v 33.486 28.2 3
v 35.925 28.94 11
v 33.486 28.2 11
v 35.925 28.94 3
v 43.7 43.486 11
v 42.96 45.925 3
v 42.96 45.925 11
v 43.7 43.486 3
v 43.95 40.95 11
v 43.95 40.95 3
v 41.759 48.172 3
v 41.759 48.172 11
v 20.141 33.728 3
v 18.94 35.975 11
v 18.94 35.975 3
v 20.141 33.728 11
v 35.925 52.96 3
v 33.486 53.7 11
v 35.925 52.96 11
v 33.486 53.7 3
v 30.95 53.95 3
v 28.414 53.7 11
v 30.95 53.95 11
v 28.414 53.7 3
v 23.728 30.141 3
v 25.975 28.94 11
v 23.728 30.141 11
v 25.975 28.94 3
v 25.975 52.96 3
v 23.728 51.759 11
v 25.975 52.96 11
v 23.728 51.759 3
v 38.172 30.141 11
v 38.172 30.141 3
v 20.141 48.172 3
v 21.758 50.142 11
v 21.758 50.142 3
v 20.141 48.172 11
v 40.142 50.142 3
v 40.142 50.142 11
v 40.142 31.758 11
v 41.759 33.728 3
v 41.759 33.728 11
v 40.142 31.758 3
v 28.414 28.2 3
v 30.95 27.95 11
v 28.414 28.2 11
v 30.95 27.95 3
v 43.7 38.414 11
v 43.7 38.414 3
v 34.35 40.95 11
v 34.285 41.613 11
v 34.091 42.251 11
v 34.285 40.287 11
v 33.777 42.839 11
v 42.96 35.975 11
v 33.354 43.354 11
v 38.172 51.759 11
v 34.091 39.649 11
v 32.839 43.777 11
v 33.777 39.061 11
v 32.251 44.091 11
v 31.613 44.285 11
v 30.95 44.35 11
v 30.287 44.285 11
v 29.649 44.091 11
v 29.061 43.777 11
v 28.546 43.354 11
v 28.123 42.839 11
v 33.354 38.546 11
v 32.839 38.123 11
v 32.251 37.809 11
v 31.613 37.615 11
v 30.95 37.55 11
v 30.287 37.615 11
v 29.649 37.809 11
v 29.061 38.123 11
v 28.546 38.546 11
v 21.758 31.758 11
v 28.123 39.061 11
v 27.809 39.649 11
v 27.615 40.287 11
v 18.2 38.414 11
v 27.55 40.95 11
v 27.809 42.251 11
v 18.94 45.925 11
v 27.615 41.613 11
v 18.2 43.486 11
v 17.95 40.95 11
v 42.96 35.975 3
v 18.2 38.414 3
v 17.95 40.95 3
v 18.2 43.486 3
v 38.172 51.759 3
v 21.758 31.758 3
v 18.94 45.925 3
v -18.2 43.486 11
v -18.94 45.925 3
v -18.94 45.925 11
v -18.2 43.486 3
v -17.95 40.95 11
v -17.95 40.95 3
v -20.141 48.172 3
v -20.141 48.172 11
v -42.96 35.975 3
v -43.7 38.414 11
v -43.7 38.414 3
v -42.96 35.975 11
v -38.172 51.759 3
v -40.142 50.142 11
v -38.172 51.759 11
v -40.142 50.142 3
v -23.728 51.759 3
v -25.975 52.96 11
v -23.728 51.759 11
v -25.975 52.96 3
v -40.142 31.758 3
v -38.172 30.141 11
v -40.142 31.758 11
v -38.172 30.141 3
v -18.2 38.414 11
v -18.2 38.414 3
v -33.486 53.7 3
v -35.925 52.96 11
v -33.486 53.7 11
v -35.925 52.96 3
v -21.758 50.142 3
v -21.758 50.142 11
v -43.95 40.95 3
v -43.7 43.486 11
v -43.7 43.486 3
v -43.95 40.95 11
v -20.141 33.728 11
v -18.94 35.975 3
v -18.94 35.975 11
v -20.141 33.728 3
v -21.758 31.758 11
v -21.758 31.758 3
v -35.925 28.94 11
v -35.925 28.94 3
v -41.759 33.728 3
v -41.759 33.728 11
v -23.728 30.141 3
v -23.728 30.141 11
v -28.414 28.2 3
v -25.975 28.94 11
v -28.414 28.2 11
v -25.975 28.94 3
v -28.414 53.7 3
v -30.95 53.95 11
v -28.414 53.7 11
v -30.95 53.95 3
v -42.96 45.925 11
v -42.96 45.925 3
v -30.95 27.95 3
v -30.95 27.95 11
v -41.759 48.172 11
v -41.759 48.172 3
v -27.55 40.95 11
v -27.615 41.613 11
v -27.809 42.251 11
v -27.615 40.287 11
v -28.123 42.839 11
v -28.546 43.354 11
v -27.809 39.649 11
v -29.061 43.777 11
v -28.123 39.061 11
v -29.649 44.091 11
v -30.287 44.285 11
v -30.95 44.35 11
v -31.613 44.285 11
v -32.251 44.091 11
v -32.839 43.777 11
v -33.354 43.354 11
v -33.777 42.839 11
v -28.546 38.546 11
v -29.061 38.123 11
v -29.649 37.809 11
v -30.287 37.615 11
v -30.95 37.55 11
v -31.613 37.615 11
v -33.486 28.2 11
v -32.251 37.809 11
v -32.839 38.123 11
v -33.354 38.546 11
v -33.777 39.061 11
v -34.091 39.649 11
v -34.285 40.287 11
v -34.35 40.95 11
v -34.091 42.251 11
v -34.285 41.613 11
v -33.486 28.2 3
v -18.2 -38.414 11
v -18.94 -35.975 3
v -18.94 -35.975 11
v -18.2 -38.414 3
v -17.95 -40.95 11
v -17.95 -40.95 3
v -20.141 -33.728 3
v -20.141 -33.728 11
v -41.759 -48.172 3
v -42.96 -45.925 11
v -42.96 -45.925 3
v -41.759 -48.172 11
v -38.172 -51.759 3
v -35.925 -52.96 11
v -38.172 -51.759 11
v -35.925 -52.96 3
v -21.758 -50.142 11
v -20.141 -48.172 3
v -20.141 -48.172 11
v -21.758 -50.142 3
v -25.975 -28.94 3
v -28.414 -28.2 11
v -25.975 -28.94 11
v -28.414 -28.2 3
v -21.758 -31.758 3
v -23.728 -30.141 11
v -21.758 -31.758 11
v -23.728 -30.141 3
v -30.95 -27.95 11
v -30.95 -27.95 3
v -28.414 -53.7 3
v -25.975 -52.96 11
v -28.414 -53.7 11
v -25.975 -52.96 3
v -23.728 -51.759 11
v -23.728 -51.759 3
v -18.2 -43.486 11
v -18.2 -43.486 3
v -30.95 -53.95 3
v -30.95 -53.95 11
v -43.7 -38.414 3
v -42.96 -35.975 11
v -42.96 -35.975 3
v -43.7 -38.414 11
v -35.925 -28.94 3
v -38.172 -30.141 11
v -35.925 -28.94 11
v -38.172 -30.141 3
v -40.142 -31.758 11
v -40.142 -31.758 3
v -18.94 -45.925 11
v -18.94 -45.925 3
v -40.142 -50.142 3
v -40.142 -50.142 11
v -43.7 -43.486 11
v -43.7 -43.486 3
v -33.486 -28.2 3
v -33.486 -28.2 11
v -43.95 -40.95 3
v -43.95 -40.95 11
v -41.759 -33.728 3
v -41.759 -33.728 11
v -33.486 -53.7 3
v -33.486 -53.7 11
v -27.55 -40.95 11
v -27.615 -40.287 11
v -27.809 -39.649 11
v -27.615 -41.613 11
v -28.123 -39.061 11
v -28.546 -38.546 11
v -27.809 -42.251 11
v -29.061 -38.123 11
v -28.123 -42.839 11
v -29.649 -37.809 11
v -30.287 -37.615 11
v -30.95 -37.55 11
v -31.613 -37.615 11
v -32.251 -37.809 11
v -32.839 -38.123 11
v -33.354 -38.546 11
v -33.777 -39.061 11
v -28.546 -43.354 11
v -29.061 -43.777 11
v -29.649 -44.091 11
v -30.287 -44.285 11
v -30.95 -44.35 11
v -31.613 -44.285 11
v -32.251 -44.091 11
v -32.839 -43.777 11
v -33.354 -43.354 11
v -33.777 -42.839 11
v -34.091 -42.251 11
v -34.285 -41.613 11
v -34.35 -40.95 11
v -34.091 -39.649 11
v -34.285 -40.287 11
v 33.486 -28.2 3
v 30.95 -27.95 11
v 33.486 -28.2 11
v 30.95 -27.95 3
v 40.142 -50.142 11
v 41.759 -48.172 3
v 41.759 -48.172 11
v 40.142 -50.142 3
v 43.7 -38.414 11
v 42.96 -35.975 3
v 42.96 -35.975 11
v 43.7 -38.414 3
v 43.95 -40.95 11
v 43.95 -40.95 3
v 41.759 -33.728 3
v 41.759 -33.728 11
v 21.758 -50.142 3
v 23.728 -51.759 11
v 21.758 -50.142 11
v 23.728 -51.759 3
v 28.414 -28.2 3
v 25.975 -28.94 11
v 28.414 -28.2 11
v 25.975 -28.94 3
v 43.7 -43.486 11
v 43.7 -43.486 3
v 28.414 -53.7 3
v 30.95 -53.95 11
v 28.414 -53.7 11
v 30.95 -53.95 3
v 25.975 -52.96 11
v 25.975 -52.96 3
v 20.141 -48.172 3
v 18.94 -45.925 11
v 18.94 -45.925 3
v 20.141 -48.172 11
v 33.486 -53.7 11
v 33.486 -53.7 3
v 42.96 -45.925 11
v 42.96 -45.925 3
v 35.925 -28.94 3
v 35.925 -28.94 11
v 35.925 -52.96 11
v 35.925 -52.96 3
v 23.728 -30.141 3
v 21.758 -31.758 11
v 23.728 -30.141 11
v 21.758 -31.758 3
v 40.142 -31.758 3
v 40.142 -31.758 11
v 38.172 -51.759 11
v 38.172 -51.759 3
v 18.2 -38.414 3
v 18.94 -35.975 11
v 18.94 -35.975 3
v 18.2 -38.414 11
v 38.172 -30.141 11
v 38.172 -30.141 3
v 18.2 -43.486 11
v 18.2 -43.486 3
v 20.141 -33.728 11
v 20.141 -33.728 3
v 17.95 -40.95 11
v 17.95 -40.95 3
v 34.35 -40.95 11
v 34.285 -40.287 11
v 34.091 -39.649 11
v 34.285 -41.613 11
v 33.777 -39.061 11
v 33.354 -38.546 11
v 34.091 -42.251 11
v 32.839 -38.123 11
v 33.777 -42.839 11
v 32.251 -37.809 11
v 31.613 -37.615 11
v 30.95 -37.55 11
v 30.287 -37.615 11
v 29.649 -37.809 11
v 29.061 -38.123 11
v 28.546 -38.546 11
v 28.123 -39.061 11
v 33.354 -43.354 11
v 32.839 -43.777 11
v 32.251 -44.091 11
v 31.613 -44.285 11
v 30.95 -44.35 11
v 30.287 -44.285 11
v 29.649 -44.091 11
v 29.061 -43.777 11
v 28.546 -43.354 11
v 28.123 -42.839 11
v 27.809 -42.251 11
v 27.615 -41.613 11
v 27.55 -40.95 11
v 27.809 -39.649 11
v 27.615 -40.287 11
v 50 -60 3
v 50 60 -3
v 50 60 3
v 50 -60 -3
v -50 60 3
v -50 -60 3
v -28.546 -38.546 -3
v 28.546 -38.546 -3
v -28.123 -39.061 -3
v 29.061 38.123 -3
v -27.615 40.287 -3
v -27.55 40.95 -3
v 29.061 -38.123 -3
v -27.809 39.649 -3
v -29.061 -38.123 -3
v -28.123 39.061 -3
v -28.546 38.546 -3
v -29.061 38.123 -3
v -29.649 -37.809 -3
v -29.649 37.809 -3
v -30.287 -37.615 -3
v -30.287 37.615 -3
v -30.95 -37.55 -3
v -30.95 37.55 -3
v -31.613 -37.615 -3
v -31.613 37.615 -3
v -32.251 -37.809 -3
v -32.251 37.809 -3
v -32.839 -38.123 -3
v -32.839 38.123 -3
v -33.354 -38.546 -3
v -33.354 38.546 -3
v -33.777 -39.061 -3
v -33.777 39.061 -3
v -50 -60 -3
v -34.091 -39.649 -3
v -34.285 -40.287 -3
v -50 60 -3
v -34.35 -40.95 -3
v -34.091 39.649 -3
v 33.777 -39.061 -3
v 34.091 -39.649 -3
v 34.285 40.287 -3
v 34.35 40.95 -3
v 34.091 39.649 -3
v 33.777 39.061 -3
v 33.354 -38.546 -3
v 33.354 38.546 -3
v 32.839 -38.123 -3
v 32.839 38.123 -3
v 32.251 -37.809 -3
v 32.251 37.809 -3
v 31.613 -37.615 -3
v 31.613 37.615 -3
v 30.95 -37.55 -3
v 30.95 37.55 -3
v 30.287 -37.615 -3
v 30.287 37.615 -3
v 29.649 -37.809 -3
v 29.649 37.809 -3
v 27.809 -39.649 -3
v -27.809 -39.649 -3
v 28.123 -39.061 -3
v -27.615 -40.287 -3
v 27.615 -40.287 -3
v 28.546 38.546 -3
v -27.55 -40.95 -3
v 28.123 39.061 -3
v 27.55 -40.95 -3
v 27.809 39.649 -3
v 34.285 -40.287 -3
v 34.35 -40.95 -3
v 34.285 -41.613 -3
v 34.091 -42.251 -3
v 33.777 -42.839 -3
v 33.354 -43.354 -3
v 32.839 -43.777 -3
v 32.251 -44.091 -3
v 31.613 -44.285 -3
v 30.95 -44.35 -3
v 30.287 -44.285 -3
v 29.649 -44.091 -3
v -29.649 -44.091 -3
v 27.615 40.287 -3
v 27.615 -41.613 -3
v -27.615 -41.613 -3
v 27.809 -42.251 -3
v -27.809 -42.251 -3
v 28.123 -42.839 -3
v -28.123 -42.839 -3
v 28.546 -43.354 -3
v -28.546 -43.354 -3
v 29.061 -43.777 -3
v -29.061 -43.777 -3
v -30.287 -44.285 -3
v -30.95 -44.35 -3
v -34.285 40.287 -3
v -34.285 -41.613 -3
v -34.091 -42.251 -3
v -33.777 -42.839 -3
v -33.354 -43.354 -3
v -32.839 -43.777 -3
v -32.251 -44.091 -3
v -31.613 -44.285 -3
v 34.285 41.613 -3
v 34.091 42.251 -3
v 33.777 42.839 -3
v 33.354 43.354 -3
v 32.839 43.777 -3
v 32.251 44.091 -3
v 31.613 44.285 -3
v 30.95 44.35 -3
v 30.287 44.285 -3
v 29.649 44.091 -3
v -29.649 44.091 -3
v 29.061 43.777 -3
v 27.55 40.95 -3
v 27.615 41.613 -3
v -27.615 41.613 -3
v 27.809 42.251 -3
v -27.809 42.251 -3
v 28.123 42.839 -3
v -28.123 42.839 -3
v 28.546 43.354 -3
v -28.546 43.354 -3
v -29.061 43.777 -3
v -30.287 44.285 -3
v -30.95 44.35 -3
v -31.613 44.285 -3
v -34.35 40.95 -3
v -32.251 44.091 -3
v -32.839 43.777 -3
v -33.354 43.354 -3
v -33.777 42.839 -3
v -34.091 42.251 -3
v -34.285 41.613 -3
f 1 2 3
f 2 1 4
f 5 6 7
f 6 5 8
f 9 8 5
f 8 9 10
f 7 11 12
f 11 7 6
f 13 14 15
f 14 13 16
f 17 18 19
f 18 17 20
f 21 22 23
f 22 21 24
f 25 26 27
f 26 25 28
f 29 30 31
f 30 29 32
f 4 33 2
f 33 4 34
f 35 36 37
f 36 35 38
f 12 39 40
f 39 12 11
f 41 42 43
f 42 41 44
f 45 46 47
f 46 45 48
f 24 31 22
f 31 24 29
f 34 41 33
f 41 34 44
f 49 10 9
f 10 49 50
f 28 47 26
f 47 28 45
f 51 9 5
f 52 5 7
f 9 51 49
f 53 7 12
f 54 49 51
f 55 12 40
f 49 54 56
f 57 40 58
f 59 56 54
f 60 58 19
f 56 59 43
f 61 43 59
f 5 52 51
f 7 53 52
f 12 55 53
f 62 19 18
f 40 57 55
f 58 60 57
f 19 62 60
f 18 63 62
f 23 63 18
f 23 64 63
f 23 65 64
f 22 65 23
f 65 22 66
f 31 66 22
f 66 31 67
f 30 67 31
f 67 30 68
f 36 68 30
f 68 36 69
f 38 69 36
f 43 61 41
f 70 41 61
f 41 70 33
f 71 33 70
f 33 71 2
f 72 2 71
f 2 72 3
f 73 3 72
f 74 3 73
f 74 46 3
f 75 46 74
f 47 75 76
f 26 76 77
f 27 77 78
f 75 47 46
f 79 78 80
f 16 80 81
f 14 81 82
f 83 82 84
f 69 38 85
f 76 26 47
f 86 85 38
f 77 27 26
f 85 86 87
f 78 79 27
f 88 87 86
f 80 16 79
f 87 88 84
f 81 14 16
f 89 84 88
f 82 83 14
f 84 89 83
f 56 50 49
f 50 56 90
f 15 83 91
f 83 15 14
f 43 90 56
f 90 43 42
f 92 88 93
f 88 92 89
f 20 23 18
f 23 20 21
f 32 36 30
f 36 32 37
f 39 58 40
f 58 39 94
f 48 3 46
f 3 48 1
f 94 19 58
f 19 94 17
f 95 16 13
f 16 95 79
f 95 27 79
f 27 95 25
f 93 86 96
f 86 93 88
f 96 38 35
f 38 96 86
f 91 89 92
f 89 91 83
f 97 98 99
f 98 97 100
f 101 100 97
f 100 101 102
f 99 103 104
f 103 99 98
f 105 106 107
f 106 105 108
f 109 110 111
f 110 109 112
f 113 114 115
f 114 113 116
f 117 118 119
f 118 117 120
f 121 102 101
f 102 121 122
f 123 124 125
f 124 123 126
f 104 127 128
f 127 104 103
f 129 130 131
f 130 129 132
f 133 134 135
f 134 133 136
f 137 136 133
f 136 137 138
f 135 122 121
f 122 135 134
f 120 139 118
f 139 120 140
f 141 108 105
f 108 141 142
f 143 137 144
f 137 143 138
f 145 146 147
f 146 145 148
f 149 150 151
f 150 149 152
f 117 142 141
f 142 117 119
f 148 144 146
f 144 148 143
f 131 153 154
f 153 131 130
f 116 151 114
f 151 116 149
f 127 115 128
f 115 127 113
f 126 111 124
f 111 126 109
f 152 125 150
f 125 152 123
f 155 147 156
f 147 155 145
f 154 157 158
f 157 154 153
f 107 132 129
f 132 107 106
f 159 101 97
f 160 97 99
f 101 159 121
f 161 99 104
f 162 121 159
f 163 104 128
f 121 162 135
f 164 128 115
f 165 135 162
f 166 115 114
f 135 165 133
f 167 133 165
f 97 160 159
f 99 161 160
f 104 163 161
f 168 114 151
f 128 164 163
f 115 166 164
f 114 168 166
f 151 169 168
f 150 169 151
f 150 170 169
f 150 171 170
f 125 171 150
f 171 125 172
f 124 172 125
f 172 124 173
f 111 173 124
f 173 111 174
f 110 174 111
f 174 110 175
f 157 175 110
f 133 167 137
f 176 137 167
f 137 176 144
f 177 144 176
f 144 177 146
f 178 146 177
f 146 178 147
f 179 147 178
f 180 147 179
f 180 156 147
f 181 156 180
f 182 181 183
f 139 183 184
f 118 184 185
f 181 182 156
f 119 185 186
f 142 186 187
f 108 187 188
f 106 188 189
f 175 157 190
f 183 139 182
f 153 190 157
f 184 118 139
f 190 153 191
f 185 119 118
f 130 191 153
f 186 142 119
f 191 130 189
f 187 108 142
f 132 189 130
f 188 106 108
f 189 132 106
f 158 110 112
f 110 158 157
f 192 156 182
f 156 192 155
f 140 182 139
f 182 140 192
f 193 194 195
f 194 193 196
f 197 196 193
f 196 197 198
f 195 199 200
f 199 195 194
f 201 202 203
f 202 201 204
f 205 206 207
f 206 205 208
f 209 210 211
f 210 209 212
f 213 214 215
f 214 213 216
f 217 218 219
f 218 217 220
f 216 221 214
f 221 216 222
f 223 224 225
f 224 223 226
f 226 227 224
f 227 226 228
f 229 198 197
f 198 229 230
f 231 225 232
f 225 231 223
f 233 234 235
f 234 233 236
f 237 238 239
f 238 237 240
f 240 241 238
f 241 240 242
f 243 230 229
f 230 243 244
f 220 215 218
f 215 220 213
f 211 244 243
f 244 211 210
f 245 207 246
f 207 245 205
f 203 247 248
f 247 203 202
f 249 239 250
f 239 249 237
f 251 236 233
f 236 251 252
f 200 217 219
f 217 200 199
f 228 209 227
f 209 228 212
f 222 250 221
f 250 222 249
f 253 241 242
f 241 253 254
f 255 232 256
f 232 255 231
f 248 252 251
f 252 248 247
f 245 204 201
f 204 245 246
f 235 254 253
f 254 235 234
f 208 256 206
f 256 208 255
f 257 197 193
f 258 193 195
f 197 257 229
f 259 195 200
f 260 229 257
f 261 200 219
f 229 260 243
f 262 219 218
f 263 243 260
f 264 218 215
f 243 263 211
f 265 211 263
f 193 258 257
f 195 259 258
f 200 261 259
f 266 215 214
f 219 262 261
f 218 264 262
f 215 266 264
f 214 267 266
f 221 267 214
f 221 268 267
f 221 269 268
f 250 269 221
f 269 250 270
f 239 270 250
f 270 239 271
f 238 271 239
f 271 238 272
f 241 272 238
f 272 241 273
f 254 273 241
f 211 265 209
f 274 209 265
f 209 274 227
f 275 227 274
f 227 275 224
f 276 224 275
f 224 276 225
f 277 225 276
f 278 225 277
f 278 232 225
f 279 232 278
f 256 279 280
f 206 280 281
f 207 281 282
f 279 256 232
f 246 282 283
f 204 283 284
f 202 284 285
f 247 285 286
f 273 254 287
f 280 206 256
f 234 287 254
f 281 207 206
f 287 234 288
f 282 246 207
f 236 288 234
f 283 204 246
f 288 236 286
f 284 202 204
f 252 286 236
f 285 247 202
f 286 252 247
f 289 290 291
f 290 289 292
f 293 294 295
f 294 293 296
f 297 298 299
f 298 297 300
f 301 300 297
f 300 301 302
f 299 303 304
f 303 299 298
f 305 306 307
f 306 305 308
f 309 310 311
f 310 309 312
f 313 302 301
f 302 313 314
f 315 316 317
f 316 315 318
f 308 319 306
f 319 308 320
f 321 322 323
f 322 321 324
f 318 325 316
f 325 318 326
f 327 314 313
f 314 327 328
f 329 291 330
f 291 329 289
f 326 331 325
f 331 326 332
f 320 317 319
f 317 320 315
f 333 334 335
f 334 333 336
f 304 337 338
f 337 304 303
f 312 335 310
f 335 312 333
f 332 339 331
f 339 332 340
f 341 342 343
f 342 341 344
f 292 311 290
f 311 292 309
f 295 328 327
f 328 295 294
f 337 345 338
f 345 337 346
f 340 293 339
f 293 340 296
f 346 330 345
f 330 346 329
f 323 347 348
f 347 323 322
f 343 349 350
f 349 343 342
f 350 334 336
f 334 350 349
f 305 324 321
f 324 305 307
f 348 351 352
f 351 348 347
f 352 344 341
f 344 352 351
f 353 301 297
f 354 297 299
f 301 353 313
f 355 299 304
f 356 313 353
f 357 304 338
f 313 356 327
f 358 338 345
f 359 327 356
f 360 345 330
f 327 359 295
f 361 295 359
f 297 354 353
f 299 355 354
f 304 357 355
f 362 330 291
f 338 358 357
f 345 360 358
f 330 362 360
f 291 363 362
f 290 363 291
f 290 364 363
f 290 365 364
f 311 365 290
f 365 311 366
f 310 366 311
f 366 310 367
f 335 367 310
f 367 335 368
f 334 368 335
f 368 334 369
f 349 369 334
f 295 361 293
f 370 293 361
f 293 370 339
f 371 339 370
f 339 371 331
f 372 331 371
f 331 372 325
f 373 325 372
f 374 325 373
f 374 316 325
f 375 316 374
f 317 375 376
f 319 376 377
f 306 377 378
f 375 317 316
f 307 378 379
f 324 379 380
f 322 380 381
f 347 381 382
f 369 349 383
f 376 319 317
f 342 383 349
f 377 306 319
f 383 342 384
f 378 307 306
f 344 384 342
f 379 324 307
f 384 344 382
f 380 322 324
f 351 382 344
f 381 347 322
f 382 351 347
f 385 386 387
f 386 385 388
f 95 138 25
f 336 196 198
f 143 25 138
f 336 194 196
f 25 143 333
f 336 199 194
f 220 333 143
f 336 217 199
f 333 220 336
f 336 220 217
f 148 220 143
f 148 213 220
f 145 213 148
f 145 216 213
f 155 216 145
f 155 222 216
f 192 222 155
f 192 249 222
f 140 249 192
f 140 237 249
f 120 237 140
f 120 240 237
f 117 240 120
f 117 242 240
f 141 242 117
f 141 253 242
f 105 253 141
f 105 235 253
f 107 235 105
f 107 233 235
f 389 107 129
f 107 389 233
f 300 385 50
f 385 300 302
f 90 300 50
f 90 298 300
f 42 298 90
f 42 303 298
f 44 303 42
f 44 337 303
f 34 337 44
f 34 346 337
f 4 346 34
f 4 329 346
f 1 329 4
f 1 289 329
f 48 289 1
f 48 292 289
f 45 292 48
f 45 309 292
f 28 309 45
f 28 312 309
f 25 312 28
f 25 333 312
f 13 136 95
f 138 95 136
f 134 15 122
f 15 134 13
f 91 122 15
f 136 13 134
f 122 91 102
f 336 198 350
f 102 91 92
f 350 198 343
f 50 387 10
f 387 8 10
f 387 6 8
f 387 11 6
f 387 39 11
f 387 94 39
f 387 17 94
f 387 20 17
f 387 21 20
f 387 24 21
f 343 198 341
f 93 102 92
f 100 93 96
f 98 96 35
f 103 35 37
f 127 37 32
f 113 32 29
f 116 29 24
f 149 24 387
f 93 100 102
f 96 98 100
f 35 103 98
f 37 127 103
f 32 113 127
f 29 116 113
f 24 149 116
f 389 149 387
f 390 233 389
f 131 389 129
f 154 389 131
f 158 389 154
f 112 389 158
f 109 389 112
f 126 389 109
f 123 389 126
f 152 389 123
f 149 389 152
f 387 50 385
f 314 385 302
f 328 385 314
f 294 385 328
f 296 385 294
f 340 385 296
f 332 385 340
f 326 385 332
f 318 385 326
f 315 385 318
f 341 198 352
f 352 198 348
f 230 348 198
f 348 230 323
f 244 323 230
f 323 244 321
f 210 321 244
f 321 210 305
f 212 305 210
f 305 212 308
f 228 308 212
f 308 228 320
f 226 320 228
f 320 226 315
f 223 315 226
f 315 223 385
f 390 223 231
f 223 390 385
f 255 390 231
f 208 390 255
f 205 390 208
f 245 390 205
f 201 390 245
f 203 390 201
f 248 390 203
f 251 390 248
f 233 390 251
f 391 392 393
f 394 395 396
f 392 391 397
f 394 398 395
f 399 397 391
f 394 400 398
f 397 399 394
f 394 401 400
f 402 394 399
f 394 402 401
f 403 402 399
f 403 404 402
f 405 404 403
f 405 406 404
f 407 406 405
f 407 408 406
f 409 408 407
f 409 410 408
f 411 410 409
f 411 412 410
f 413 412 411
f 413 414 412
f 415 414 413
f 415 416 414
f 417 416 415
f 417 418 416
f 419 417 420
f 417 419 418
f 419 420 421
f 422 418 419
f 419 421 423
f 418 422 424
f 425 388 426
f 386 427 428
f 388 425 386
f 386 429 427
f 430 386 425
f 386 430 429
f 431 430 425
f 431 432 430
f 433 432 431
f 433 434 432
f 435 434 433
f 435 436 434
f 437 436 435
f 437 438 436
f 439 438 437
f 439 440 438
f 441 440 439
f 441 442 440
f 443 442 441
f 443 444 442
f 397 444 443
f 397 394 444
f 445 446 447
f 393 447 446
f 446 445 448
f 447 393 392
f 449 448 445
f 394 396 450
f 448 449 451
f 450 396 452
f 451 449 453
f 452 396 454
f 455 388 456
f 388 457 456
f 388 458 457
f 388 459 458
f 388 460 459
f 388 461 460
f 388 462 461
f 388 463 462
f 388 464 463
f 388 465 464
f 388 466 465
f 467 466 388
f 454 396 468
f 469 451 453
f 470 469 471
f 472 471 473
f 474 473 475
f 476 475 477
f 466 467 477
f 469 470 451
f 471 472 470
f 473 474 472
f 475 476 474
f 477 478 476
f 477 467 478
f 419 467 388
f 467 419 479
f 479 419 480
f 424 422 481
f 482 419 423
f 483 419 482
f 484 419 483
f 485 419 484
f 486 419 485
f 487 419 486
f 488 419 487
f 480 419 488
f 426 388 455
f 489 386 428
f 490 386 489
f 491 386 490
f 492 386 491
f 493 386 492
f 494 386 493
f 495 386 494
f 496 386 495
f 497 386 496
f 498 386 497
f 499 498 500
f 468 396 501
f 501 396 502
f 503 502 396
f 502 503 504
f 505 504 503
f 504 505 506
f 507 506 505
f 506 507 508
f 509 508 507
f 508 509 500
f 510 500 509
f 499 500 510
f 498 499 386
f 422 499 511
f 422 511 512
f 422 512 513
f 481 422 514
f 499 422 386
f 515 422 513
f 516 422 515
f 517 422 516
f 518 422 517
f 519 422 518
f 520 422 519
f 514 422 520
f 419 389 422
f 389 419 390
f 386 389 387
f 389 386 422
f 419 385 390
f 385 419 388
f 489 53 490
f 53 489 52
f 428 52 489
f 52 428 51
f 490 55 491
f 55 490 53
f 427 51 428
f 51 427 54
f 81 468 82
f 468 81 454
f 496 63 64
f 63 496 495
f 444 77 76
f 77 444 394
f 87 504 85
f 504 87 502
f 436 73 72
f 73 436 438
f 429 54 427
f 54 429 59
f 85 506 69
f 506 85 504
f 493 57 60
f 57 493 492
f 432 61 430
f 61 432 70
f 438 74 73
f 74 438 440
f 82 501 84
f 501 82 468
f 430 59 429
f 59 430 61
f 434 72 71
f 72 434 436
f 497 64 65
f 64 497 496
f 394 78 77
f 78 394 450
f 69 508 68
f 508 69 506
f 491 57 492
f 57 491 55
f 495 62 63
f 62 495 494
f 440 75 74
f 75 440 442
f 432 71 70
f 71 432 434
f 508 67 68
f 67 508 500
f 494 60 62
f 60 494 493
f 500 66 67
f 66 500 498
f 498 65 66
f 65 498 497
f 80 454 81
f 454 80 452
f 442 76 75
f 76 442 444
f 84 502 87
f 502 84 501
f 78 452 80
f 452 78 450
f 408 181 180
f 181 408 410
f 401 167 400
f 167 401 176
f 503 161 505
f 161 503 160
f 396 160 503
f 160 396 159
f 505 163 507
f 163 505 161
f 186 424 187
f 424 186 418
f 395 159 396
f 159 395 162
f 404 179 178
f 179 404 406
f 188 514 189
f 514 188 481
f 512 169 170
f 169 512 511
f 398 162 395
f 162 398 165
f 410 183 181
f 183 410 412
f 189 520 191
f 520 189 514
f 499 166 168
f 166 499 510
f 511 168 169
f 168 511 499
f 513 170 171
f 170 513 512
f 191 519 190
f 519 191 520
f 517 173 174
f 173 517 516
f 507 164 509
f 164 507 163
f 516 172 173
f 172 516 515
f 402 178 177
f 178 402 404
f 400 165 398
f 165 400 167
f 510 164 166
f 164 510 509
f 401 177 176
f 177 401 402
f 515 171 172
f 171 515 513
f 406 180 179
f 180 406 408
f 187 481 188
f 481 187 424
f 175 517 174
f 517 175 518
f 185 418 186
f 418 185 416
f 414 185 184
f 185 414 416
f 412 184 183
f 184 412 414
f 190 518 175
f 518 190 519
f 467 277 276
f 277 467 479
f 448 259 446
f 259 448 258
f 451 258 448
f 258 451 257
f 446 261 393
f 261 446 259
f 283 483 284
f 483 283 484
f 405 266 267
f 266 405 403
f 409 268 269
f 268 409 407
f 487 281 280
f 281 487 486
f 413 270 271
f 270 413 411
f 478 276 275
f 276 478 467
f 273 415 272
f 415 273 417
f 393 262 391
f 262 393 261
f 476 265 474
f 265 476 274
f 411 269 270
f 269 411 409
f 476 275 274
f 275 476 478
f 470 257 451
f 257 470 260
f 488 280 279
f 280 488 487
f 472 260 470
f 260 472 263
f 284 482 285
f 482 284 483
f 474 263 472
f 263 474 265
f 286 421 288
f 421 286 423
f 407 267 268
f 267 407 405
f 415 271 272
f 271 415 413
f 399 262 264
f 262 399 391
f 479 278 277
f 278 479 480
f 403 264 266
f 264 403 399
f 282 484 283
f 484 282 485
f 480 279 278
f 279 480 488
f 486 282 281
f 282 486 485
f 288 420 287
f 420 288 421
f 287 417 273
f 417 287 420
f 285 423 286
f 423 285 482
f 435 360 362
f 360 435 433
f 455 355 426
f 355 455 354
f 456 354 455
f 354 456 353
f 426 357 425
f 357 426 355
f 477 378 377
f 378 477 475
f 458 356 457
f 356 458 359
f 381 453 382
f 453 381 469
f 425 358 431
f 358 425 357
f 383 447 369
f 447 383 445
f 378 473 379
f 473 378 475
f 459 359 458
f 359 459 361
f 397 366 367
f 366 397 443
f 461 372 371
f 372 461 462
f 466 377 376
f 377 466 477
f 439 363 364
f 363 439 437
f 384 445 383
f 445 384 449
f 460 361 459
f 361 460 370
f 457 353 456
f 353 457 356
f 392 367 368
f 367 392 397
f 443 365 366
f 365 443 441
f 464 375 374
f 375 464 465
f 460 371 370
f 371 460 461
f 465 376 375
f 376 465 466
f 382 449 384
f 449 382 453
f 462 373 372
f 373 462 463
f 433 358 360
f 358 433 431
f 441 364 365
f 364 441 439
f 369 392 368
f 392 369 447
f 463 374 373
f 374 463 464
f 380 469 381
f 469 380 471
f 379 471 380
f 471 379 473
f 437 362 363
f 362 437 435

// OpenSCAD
$fn = 32;

// ----------------------------------------------------------------------
// Anchor pads 100 x 120 x 14
// four corner bosses with anchor holes
// ----------------------------------------------------------------------

// --- parameters (mm) ---
plate = [100, 120, 6];  // base plate size (x, y, z)
pads = 4;               // boss count, one per corner
edge = 19.05;           // boss centre offset from the plate edge
boss_d = 26;            // boss diameter
boss_h = 8;             // boss height above the base plate
bore_d = 6.6;           // nominal hole diameter from the drawing
print_allowance = 0.2;  // clearance added for printing

// --- derived feature positions (mm) ---
hole_d = bore_d + print_allowance;  // = 6.8   hole diameter as printed
height = plate[2] + boss_h;         // = 14   overall height of the part
corner_x = plate[0] / 2 - edge;     // = 30.95   boss centre X
corner_y = plate[1] / 2 - edge;     // = 40.95   boss centre Y
feature_centers = [
  [corner_x, corner_y],
  [-corner_x, corner_y],
  [-corner_x, -corner_y],
  [corner_x, -corner_y]
];   // boss centres, anchor holes are drilled there

// base plate, four bosses standing on it, anchor holes all the way through
difference() {
  union() {
    cube(plate, center = true);
    for (centre = feature_centers)
      translate([centre[0], centre[1], plate[2] / 2 - 1])
        cylinder(d = boss_d, h = boss_h + 1);
  }
  for (centre = feature_centers)
    translate([centre[0], centre[1], -height])
      cylinder(d = hole_d, h = 2 * height + 2);  // through boss and plate
}
